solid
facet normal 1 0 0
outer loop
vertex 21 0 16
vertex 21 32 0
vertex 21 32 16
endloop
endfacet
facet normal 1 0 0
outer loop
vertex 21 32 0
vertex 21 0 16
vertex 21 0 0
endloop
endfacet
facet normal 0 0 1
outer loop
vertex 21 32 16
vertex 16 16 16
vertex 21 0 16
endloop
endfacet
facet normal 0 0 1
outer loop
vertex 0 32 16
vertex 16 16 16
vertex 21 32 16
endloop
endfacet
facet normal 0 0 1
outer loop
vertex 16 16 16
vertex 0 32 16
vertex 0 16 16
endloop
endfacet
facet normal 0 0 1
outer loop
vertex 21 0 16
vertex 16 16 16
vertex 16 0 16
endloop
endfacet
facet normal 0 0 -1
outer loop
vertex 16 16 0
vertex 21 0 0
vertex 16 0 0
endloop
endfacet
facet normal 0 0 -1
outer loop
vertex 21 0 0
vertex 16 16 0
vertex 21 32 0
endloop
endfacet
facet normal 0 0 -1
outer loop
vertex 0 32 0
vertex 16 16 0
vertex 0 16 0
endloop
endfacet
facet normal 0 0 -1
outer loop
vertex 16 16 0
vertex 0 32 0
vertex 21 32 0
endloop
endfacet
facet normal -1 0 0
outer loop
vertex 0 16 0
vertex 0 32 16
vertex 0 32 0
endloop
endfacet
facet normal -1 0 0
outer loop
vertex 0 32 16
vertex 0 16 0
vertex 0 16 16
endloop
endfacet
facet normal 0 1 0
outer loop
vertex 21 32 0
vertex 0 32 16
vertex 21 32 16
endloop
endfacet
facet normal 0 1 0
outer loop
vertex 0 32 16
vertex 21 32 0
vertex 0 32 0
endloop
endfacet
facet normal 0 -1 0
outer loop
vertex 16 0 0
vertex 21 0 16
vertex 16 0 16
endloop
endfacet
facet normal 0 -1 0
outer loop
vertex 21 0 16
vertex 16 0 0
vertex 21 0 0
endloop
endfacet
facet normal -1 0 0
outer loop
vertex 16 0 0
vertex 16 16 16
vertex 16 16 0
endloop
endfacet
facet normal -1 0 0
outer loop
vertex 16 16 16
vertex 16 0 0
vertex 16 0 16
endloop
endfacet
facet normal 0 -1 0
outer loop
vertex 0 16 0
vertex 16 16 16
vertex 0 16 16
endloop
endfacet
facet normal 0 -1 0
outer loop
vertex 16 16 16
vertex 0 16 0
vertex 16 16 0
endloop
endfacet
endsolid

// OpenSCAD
difference() {
  cube([16+5,16+16,16]);
  //cube([16+5,16+10,16]);
  cube([16,16,16]);
}
